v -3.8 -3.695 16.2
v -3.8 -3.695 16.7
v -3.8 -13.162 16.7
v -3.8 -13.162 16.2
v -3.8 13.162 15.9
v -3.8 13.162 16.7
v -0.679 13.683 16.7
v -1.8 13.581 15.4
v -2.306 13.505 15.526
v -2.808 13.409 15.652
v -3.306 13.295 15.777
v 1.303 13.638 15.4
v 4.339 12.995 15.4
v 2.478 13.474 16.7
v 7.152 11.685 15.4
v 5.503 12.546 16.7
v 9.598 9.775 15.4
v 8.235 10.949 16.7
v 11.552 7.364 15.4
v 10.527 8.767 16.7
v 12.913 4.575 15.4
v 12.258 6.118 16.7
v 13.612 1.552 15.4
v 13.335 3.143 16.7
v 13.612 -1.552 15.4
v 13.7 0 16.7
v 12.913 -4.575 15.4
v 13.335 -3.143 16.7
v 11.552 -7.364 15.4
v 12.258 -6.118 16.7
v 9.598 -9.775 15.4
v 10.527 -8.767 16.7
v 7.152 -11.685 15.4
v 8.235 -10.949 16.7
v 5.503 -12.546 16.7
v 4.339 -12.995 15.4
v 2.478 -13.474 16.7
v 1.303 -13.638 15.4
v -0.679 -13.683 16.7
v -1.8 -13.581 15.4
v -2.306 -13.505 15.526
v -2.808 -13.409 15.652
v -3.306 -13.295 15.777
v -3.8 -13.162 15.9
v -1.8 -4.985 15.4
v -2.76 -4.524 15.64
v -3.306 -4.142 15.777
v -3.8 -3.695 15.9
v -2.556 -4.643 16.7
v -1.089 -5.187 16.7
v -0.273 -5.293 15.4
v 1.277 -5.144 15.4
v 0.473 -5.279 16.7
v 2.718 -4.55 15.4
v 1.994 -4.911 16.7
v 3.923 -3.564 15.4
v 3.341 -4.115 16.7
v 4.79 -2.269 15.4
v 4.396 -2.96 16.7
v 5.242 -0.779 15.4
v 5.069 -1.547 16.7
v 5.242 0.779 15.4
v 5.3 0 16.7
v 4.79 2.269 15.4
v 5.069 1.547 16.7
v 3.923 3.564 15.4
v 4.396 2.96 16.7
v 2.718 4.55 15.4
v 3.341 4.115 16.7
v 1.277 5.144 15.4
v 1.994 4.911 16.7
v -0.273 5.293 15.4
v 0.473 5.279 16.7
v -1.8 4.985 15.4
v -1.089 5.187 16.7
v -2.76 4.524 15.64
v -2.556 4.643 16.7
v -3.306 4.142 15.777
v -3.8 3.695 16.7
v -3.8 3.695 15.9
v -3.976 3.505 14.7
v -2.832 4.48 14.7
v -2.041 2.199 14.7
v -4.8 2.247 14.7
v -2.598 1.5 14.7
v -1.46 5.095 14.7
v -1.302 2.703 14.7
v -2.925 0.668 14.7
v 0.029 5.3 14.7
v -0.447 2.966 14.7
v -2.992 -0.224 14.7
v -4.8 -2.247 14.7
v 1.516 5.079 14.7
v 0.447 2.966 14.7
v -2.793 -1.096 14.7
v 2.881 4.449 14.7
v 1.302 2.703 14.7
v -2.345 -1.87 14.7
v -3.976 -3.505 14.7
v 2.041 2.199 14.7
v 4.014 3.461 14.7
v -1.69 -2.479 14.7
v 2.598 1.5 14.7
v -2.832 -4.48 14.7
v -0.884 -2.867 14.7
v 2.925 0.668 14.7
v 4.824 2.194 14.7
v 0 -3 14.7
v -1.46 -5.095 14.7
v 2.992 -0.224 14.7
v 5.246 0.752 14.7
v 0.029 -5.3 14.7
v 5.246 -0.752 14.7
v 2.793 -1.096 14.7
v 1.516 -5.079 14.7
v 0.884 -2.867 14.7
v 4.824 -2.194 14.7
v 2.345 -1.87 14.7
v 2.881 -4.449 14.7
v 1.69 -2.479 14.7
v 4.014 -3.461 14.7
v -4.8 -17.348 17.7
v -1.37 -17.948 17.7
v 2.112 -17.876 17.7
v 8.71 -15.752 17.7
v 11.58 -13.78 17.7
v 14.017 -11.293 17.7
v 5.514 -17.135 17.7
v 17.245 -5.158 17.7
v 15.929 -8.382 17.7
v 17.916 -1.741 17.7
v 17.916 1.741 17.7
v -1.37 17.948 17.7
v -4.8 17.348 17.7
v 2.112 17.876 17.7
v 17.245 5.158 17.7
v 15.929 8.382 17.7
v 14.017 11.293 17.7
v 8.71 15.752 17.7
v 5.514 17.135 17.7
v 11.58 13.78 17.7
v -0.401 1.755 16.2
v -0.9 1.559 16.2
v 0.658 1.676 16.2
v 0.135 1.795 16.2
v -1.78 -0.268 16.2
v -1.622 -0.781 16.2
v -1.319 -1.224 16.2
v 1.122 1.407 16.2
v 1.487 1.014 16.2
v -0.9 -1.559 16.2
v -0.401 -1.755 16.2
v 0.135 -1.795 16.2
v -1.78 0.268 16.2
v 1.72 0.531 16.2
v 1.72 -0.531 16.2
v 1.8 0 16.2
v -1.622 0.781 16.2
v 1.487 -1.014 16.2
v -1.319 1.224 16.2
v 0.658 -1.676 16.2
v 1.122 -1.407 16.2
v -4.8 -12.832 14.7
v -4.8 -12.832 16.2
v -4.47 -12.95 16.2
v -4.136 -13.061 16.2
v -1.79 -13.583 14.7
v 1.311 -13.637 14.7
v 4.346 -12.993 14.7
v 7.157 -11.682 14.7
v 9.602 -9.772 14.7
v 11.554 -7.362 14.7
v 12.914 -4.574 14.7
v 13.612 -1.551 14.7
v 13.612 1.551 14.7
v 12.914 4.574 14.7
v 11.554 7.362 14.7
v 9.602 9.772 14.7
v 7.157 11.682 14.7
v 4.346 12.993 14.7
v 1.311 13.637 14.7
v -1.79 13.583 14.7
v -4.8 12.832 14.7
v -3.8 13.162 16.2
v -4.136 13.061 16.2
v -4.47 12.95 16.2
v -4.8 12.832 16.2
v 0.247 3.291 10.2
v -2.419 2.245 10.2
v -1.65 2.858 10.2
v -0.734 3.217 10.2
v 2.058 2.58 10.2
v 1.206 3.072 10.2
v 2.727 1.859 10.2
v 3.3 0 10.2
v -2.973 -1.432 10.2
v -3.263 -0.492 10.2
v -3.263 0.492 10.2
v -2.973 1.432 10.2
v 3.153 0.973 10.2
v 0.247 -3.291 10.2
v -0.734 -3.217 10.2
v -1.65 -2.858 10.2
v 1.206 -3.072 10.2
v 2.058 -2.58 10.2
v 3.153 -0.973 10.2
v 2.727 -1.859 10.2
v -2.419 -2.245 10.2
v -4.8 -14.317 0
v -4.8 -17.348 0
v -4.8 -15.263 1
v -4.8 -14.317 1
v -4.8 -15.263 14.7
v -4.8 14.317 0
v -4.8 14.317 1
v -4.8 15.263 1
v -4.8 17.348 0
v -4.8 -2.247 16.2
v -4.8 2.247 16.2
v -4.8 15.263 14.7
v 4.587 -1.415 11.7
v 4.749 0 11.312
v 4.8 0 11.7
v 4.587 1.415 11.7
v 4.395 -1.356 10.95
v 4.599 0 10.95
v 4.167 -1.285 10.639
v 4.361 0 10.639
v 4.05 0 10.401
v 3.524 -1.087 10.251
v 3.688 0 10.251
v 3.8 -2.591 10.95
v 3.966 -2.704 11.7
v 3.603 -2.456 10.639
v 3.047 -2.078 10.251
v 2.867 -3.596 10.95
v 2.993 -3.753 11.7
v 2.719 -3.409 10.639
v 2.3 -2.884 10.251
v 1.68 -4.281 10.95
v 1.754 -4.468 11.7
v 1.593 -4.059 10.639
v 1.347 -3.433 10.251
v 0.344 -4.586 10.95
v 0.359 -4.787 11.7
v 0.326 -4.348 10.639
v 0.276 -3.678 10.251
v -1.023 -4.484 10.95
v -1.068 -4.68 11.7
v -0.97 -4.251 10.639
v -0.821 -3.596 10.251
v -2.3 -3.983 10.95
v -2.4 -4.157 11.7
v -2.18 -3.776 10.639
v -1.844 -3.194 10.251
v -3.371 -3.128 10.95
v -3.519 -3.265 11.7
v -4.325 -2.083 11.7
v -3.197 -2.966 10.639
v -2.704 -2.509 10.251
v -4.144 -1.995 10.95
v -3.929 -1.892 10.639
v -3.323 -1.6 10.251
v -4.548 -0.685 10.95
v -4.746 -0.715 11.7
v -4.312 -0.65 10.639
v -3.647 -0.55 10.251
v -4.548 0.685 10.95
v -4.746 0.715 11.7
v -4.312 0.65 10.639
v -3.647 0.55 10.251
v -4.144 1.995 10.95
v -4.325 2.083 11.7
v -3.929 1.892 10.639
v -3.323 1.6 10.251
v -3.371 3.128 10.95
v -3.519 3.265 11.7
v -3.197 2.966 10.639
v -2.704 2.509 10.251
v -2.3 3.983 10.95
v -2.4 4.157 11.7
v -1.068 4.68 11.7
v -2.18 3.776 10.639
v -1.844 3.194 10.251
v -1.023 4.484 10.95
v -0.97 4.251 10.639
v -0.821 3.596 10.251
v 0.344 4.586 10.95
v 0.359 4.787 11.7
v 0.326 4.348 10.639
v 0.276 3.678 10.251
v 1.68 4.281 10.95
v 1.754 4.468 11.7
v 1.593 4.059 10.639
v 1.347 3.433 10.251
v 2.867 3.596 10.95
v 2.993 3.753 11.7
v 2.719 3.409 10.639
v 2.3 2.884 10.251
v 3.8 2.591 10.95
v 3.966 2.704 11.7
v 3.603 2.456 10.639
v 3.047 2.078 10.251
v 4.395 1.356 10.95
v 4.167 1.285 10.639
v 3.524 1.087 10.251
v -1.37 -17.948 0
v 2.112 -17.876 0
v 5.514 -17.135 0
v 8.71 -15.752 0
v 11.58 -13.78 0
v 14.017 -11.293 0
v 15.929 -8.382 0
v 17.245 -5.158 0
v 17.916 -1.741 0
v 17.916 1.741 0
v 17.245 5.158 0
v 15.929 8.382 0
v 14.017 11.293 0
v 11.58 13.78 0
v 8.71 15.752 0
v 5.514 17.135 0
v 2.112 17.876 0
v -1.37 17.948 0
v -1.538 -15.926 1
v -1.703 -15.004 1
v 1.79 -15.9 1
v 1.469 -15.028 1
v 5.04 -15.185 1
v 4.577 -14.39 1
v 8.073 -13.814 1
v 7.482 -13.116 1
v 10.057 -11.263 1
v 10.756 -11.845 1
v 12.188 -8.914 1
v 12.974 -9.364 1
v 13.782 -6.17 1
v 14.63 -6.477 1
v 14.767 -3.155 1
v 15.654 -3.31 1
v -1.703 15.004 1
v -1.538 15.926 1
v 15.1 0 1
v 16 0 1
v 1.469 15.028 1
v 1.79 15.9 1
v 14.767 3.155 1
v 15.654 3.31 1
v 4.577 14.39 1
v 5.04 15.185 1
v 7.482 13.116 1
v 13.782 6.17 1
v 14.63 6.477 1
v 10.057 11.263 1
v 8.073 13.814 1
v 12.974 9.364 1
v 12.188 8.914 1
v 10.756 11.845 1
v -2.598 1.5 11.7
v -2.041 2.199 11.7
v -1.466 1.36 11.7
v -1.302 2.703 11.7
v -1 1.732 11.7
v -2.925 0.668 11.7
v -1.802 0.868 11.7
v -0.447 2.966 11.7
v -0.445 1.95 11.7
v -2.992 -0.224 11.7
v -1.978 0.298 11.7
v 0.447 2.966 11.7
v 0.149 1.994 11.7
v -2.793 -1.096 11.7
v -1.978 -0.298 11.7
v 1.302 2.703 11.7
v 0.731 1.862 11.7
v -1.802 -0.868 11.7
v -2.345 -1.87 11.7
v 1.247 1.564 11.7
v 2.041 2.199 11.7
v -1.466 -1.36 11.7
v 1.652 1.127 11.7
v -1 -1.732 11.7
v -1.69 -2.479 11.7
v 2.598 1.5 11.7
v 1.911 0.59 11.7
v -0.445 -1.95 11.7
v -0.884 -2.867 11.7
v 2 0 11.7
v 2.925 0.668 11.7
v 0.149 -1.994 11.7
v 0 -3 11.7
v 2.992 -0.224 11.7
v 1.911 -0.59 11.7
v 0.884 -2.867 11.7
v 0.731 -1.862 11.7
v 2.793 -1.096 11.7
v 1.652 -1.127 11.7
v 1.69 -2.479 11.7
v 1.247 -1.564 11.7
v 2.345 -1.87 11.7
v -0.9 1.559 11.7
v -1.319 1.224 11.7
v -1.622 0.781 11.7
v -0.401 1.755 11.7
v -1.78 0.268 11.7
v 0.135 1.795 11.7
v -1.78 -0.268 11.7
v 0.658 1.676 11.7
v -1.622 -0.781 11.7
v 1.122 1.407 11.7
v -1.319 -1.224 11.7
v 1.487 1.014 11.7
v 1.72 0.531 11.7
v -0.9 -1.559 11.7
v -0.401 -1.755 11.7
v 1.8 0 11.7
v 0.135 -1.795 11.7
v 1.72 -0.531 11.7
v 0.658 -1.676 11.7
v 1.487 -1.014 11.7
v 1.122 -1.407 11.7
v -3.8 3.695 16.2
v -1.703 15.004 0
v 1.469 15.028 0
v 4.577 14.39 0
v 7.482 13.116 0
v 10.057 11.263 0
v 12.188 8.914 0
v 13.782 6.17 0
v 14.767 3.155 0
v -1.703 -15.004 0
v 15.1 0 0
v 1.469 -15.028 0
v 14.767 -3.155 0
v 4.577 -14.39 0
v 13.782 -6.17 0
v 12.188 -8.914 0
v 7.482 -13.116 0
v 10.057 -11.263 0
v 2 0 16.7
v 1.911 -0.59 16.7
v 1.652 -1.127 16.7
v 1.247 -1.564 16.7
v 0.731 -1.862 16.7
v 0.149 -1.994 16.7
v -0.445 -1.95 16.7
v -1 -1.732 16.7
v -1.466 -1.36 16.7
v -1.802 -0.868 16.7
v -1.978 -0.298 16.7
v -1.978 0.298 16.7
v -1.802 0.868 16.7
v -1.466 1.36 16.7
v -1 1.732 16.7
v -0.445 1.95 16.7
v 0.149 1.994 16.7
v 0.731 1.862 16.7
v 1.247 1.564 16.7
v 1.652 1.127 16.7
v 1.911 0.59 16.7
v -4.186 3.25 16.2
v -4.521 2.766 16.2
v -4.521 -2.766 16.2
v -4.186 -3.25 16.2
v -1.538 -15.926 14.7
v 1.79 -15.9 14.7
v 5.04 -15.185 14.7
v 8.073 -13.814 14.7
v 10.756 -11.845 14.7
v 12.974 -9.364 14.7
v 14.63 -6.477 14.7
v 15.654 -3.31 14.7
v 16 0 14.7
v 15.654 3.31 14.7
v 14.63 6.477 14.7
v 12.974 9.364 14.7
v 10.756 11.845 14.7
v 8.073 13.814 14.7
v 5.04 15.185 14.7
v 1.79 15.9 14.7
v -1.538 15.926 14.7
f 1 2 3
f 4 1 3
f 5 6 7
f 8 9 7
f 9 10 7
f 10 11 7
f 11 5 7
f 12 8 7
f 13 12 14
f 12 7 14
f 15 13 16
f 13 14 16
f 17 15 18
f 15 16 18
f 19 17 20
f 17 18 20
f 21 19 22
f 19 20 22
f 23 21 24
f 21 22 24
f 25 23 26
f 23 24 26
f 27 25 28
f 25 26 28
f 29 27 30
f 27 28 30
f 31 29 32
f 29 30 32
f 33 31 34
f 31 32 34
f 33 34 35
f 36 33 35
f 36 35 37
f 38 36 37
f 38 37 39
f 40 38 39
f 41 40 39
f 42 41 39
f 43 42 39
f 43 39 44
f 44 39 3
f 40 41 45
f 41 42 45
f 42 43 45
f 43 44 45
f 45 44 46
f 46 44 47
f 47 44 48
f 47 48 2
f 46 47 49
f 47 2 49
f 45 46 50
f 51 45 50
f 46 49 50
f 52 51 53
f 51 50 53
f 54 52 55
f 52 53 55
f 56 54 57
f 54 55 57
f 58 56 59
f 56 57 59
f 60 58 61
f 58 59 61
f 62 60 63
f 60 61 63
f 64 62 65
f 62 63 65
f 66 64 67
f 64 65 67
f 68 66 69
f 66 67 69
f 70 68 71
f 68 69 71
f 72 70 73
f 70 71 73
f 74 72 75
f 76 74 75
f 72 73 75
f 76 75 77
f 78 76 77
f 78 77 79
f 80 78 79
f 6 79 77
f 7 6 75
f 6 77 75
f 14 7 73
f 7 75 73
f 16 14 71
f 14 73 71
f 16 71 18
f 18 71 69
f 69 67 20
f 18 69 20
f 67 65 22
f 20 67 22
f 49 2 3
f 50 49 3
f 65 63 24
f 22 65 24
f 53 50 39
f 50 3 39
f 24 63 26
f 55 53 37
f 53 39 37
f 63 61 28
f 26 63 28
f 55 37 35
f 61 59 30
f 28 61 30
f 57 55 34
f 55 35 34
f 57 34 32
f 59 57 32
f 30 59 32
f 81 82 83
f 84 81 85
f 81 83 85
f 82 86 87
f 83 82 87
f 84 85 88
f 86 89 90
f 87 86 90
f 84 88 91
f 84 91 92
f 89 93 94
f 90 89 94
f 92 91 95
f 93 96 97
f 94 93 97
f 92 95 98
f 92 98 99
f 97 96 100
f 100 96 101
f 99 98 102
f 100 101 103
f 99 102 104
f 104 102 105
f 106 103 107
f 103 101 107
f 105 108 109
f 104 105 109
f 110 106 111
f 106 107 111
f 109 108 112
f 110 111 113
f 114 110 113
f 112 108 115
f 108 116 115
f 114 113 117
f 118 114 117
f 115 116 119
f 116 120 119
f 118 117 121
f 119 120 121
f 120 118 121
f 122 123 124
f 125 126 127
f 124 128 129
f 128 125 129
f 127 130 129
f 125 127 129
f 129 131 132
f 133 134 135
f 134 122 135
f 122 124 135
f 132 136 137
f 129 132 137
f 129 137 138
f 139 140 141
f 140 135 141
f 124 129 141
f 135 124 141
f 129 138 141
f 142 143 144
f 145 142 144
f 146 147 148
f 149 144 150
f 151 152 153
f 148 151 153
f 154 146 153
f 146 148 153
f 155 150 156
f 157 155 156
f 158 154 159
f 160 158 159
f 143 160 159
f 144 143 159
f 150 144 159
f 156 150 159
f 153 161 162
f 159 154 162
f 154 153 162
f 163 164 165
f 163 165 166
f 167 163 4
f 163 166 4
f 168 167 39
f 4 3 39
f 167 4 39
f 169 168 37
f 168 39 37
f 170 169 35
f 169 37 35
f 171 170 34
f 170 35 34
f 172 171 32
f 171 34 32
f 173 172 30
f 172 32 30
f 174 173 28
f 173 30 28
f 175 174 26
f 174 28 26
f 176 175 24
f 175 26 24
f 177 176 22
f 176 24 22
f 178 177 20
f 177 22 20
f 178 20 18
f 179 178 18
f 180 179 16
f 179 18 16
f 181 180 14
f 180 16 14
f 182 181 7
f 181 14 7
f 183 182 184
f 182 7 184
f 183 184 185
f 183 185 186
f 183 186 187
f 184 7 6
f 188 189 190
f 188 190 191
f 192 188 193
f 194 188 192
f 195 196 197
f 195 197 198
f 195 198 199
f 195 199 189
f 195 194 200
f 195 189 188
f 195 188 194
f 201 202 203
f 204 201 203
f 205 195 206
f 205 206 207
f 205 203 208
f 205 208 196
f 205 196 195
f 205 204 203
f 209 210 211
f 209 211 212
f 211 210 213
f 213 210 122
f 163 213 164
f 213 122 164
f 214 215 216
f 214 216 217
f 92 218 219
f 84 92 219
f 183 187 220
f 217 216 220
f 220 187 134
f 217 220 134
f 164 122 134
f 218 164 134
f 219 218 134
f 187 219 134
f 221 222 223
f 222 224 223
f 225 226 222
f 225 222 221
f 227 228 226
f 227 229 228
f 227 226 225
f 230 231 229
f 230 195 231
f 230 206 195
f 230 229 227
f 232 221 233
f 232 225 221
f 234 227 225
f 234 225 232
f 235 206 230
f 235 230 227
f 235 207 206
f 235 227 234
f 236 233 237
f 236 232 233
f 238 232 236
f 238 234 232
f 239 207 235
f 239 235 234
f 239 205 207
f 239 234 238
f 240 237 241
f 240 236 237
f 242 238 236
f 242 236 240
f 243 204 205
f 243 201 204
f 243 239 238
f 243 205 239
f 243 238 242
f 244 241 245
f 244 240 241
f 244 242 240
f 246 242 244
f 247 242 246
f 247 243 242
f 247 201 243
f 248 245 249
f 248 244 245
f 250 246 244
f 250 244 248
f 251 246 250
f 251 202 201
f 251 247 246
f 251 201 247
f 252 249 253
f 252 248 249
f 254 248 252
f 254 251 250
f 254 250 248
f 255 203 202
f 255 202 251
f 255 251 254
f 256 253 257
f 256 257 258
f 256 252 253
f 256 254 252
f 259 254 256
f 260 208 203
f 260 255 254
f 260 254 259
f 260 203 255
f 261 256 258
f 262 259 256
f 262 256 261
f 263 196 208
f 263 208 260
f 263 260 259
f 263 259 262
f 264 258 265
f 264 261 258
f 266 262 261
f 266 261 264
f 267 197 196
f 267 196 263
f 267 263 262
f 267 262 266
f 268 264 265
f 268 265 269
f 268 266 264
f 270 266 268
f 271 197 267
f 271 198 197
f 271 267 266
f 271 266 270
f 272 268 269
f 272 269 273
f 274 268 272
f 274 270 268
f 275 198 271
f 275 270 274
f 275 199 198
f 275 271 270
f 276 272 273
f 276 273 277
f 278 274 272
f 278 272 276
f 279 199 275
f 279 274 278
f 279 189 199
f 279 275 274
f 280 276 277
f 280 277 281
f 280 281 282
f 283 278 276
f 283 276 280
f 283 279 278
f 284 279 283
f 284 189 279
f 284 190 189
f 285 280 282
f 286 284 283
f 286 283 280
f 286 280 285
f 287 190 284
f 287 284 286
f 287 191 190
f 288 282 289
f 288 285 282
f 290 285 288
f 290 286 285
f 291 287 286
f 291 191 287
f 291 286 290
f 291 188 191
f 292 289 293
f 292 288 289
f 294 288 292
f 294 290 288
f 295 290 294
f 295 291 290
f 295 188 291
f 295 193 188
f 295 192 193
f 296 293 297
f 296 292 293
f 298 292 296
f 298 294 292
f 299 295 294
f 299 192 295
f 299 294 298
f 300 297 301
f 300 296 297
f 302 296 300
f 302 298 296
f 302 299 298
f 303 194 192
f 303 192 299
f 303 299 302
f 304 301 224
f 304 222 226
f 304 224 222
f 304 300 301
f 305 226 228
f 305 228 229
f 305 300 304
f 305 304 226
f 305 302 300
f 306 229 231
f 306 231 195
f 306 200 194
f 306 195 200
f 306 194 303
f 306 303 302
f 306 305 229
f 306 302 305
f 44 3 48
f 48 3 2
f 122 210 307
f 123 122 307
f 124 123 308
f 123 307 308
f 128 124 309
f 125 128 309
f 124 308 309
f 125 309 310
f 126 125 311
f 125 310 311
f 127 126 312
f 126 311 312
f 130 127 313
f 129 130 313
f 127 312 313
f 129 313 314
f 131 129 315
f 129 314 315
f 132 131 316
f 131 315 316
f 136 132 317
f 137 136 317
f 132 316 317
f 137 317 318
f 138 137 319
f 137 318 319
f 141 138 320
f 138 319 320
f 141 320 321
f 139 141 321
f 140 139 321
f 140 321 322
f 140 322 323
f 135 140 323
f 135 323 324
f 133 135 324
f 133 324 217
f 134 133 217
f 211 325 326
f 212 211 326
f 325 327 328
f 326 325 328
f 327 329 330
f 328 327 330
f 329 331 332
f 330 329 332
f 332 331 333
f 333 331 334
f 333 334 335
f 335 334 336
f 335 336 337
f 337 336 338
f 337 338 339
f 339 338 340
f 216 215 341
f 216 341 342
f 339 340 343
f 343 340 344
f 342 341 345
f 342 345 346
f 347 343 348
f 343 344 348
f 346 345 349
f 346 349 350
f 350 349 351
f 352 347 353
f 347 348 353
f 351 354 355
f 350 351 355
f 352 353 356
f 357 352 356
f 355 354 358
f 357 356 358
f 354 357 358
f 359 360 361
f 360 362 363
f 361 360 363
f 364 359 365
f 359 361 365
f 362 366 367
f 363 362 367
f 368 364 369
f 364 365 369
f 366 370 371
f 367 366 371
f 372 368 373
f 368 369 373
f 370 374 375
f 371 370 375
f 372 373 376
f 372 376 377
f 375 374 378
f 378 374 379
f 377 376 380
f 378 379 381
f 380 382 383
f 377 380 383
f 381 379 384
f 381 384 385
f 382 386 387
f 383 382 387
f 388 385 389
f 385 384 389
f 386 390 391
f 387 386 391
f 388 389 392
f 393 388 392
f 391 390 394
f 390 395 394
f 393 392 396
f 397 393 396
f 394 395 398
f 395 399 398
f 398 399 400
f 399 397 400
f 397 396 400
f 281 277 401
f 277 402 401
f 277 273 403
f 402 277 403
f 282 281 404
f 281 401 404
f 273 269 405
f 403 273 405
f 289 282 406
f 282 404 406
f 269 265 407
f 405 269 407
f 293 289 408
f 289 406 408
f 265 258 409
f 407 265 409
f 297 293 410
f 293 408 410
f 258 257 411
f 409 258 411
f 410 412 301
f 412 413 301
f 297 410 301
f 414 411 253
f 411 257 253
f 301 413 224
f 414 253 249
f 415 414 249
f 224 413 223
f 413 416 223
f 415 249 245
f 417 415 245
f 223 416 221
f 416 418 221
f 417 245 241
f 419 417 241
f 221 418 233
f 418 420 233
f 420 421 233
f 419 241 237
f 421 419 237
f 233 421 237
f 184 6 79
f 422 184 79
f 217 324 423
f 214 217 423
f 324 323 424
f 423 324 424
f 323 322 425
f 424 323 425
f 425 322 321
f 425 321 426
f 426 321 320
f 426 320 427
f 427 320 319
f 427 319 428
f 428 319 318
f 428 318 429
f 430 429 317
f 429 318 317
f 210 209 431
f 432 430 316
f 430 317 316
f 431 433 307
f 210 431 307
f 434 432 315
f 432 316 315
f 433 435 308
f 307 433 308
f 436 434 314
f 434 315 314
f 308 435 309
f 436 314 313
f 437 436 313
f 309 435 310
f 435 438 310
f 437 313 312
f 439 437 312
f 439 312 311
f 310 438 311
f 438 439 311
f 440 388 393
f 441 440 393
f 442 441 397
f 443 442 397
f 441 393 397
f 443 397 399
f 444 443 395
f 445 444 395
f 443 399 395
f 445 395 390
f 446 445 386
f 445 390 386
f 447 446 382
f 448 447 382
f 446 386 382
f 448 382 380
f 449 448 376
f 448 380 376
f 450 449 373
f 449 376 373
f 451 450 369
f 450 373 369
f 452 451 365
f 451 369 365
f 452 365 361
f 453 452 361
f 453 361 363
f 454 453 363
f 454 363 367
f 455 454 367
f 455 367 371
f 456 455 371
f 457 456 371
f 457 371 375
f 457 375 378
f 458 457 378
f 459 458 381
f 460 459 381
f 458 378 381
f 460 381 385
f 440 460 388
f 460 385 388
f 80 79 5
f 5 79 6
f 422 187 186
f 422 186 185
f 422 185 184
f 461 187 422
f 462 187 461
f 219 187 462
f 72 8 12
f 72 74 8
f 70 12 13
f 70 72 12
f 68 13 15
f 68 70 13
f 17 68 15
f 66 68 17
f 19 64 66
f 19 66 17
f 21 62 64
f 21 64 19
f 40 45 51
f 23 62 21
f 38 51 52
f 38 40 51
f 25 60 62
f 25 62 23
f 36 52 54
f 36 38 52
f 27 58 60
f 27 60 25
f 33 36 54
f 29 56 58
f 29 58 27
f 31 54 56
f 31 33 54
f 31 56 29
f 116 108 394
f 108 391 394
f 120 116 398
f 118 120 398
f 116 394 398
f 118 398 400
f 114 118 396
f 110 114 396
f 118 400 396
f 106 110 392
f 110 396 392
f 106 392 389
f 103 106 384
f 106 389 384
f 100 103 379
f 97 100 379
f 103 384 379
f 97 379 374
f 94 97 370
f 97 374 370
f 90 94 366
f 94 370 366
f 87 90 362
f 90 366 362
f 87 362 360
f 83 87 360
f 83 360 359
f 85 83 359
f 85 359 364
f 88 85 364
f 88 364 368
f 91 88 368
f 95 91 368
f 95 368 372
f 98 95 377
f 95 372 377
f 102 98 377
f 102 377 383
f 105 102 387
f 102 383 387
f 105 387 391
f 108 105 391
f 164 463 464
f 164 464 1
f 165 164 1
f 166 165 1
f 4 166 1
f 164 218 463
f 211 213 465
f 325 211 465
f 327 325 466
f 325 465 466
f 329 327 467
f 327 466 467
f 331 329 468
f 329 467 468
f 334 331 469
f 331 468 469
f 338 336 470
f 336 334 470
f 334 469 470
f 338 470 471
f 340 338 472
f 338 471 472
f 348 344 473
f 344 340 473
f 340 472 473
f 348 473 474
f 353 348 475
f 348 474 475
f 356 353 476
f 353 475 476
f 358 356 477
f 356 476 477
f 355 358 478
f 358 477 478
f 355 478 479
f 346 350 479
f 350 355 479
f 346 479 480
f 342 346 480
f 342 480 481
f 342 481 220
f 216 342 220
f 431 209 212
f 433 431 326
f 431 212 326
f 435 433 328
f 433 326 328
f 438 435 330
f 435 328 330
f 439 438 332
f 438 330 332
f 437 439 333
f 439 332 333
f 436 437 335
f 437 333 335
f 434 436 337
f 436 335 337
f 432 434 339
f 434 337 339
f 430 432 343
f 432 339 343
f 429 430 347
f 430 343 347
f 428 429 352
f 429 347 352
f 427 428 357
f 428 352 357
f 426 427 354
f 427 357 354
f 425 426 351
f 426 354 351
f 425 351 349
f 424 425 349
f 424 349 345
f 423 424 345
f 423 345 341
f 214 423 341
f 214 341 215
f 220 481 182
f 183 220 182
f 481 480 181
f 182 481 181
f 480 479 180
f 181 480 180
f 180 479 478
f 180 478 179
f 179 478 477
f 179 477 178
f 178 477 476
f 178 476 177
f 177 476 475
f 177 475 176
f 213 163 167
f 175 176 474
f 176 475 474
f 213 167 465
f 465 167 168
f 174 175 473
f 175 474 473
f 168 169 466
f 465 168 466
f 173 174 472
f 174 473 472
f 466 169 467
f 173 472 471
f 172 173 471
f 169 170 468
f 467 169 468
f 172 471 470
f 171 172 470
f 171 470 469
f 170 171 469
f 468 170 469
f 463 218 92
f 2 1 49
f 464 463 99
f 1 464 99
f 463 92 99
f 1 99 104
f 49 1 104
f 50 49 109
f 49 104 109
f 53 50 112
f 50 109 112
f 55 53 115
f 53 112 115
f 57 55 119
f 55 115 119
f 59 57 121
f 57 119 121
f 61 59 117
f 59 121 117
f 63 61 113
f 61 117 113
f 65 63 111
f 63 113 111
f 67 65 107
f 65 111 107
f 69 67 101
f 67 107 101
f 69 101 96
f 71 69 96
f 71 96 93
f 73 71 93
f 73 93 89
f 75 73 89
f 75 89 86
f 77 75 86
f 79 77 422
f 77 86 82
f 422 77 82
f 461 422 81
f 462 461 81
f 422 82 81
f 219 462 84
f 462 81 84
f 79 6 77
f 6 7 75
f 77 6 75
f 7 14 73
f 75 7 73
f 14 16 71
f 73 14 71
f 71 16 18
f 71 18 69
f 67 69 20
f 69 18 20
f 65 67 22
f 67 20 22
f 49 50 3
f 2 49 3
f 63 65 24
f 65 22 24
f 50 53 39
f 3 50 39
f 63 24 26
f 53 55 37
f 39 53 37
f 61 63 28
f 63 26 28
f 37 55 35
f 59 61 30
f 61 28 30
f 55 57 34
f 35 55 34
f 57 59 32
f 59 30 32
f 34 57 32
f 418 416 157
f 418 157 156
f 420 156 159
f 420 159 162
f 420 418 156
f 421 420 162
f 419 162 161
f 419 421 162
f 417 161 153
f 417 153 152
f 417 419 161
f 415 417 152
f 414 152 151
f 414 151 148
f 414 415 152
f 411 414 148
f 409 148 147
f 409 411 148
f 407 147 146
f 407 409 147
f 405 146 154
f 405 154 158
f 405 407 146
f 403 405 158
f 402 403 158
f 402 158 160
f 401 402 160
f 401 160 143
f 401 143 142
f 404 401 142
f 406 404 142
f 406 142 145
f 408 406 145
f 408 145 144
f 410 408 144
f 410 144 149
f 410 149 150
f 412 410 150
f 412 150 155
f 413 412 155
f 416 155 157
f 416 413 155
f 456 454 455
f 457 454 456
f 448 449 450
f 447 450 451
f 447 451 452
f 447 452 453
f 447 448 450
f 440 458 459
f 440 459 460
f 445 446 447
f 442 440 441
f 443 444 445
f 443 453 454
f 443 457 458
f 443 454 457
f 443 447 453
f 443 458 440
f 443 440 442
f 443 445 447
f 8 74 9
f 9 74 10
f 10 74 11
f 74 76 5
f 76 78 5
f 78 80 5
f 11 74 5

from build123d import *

# Parameters (mm, degrees)
F2_W          = 13.2
F2_H          = 17.7
F3_DEPTH      = 25
F3_DEPTH_BACK = 25
F5_DEPTH      = 0.5
F6_R          = 2
F7_DEPTH      = 5
F8_R          = 1.8
F9_DEPTH      = 4.5
F10_R         = 4.8
F10_R_2       = 1.8
F11_DEPTH     = 1.5
F12_R         = 1.49999
F14_DEPTH     = 1.3
F15_SIZE2     = 0.5
F15_SIZE      = 2


# Not quite as in the source:
# - a fillet or chamfer is up to 0.001 mm smaller than in the source, because OpenCascade refuses the exact size


with BuildPart() as f1:
    # F0 (on Right) → F1 (revolve)
    with BuildSketch(Plane.YZ):
        Polygon((0, 11.7), (0, 17.7), (-18, 17.7), (-18, 0), (-15.1, 0), (-15.1, 1), (-16, 1), (-16, 14.7), (-13.7, 14.7), (-13.7, 16.7), (-5.3, 16.7), (-5.3, 14.7), (-3, 14.7), (-3, 11.7), align=None)
    revolve(axis=Axis((0, 0, 39.4193158346), (0, 0, 1)))

    # F2 (on Front) → F3 (cut, two sides)
    with BuildSketch(Plane.XZ) as f3_sk:
        with Locations((-11.4, 8.85)):
            Rectangle(F2_W, F2_H)
    extrude(amount=F3_DEPTH, mode=Mode.SUBTRACT)
    extrude(f3_sk.sketch, amount=-F3_DEPTH_BACK, mode=Mode.SUBTRACT)

    # F4 (on face) → F5 (join)
    with BuildSketch(Plane(origin=(0, 0, 16.7), x_dir=(1, 0, 0), z_dir=(0, 0, -1))):
        with BuildLine():
            ThreePointArc((-3.8, 13.1624465811), (-4.3031807536, 13.0066381284), (-4.8, 12.8316016148))
            Line((-4.8, 12.8316016148), (-4.8, 2.2472205054))
            ThreePointArc((-4.8, 2.2472205054), (-4.3604724603, 3.012686496), (-3.8, 3.6945906404))
            Line((-3.8, 3.6945906404), (-3.8, 13.1624465811))
        make_face()
        with BuildLine():
            ThreePointArc((-4.8, -12.8316016148), (-4.3031807536, -13.0066381284), (-3.8, -13.1624465811))
            Line((-3.8, -13.1624465811), (-3.8, -3.6945906404))
            ThreePointArc((-3.8, -3.6945906404), (-4.3604724603, -3.012686496), (-4.8, -2.2472205054))
            Line((-4.8, -2.2472205054), (-4.8, -12.8316016148))
        make_face()
    extrude(amount=F5_DEPTH)

    # F6 (on face) → F7 (cut)
    with BuildSketch(Plane(origin=(0, 0, 11.7), x_dir=(1, 0, 0), z_dir=(0, 0, -1))):
        Circle(F6_R)
    extrude(amount=-F7_DEPTH, mode=Mode.SUBTRACT)


with BuildPart() as f9:
    # F8 (on face) → F9 (new body)
    with BuildSketch(Plane(origin=(0, 0, 11.7), x_dir=(1, 0, 0), z_dir=(0, 0, -1))):
        Circle(F8_R)
    extrude(amount=-F9_DEPTH)

    # F10 (on face) → F11 (join)
    with BuildSketch(Plane(origin=(0, 0, 11.7), x_dir=(1, 0, 0), z_dir=(0, 0, -1))):
        Circle(F10_R)
        Circle(F10_R_2, mode=Mode.SUBTRACT)
        Circle(F10_R_2)
    extrude(amount=F11_DEPTH)

    # F12 (radius 1.5 in the source; OpenCascade refuses exactly that, so slightly less here)
    f12_edges = [f9.edges().sort_by_distance(p)[0] for p in [
        (-4.8, 0, 10.2),
    ]]
    fillet(f12_edges, radius=F12_R)


with BuildPart() as f14:
    # F13 (on face) → F14 (new body)
    with BuildSketch(Plane(origin=(0, 0, 16.7), x_dir=(1, 0, 0), z_dir=(0, 0, -1))):
        with BuildLine():
            Line((-3.8, -3.6945906404), (-3.8, -13.1624465811))
            ThreePointArc((-3.8, -13.1624465811), (13.7, 0), (-3.8, 13.1624465811))
            Line((-3.8, 13.1624465811), (-3.8, 3.6945906404))
            ThreePointArc((-3.8, 3.6945906404), (5.3, 0), (-3.8, -3.6945906404))
        make_face()
    extrude(amount=F14_DEPTH)

    # F15
    f15_edges = [f14.edges().sort_by_distance(p)[0] for p in [
        (-3.8, 8.428519, 15.4),
        (-3.8, -8.428519, 15.4),
    ]]
    f15_side = f14.faces().sort_by_distance((-3.474883, -8.428519, 15.4))[0]
    chamfer(f15_edges, length=F15_SIZE, length2=F15_SIZE2, reference=f15_side)


solid = Compound([f1.part, f9.part, f14.part])
